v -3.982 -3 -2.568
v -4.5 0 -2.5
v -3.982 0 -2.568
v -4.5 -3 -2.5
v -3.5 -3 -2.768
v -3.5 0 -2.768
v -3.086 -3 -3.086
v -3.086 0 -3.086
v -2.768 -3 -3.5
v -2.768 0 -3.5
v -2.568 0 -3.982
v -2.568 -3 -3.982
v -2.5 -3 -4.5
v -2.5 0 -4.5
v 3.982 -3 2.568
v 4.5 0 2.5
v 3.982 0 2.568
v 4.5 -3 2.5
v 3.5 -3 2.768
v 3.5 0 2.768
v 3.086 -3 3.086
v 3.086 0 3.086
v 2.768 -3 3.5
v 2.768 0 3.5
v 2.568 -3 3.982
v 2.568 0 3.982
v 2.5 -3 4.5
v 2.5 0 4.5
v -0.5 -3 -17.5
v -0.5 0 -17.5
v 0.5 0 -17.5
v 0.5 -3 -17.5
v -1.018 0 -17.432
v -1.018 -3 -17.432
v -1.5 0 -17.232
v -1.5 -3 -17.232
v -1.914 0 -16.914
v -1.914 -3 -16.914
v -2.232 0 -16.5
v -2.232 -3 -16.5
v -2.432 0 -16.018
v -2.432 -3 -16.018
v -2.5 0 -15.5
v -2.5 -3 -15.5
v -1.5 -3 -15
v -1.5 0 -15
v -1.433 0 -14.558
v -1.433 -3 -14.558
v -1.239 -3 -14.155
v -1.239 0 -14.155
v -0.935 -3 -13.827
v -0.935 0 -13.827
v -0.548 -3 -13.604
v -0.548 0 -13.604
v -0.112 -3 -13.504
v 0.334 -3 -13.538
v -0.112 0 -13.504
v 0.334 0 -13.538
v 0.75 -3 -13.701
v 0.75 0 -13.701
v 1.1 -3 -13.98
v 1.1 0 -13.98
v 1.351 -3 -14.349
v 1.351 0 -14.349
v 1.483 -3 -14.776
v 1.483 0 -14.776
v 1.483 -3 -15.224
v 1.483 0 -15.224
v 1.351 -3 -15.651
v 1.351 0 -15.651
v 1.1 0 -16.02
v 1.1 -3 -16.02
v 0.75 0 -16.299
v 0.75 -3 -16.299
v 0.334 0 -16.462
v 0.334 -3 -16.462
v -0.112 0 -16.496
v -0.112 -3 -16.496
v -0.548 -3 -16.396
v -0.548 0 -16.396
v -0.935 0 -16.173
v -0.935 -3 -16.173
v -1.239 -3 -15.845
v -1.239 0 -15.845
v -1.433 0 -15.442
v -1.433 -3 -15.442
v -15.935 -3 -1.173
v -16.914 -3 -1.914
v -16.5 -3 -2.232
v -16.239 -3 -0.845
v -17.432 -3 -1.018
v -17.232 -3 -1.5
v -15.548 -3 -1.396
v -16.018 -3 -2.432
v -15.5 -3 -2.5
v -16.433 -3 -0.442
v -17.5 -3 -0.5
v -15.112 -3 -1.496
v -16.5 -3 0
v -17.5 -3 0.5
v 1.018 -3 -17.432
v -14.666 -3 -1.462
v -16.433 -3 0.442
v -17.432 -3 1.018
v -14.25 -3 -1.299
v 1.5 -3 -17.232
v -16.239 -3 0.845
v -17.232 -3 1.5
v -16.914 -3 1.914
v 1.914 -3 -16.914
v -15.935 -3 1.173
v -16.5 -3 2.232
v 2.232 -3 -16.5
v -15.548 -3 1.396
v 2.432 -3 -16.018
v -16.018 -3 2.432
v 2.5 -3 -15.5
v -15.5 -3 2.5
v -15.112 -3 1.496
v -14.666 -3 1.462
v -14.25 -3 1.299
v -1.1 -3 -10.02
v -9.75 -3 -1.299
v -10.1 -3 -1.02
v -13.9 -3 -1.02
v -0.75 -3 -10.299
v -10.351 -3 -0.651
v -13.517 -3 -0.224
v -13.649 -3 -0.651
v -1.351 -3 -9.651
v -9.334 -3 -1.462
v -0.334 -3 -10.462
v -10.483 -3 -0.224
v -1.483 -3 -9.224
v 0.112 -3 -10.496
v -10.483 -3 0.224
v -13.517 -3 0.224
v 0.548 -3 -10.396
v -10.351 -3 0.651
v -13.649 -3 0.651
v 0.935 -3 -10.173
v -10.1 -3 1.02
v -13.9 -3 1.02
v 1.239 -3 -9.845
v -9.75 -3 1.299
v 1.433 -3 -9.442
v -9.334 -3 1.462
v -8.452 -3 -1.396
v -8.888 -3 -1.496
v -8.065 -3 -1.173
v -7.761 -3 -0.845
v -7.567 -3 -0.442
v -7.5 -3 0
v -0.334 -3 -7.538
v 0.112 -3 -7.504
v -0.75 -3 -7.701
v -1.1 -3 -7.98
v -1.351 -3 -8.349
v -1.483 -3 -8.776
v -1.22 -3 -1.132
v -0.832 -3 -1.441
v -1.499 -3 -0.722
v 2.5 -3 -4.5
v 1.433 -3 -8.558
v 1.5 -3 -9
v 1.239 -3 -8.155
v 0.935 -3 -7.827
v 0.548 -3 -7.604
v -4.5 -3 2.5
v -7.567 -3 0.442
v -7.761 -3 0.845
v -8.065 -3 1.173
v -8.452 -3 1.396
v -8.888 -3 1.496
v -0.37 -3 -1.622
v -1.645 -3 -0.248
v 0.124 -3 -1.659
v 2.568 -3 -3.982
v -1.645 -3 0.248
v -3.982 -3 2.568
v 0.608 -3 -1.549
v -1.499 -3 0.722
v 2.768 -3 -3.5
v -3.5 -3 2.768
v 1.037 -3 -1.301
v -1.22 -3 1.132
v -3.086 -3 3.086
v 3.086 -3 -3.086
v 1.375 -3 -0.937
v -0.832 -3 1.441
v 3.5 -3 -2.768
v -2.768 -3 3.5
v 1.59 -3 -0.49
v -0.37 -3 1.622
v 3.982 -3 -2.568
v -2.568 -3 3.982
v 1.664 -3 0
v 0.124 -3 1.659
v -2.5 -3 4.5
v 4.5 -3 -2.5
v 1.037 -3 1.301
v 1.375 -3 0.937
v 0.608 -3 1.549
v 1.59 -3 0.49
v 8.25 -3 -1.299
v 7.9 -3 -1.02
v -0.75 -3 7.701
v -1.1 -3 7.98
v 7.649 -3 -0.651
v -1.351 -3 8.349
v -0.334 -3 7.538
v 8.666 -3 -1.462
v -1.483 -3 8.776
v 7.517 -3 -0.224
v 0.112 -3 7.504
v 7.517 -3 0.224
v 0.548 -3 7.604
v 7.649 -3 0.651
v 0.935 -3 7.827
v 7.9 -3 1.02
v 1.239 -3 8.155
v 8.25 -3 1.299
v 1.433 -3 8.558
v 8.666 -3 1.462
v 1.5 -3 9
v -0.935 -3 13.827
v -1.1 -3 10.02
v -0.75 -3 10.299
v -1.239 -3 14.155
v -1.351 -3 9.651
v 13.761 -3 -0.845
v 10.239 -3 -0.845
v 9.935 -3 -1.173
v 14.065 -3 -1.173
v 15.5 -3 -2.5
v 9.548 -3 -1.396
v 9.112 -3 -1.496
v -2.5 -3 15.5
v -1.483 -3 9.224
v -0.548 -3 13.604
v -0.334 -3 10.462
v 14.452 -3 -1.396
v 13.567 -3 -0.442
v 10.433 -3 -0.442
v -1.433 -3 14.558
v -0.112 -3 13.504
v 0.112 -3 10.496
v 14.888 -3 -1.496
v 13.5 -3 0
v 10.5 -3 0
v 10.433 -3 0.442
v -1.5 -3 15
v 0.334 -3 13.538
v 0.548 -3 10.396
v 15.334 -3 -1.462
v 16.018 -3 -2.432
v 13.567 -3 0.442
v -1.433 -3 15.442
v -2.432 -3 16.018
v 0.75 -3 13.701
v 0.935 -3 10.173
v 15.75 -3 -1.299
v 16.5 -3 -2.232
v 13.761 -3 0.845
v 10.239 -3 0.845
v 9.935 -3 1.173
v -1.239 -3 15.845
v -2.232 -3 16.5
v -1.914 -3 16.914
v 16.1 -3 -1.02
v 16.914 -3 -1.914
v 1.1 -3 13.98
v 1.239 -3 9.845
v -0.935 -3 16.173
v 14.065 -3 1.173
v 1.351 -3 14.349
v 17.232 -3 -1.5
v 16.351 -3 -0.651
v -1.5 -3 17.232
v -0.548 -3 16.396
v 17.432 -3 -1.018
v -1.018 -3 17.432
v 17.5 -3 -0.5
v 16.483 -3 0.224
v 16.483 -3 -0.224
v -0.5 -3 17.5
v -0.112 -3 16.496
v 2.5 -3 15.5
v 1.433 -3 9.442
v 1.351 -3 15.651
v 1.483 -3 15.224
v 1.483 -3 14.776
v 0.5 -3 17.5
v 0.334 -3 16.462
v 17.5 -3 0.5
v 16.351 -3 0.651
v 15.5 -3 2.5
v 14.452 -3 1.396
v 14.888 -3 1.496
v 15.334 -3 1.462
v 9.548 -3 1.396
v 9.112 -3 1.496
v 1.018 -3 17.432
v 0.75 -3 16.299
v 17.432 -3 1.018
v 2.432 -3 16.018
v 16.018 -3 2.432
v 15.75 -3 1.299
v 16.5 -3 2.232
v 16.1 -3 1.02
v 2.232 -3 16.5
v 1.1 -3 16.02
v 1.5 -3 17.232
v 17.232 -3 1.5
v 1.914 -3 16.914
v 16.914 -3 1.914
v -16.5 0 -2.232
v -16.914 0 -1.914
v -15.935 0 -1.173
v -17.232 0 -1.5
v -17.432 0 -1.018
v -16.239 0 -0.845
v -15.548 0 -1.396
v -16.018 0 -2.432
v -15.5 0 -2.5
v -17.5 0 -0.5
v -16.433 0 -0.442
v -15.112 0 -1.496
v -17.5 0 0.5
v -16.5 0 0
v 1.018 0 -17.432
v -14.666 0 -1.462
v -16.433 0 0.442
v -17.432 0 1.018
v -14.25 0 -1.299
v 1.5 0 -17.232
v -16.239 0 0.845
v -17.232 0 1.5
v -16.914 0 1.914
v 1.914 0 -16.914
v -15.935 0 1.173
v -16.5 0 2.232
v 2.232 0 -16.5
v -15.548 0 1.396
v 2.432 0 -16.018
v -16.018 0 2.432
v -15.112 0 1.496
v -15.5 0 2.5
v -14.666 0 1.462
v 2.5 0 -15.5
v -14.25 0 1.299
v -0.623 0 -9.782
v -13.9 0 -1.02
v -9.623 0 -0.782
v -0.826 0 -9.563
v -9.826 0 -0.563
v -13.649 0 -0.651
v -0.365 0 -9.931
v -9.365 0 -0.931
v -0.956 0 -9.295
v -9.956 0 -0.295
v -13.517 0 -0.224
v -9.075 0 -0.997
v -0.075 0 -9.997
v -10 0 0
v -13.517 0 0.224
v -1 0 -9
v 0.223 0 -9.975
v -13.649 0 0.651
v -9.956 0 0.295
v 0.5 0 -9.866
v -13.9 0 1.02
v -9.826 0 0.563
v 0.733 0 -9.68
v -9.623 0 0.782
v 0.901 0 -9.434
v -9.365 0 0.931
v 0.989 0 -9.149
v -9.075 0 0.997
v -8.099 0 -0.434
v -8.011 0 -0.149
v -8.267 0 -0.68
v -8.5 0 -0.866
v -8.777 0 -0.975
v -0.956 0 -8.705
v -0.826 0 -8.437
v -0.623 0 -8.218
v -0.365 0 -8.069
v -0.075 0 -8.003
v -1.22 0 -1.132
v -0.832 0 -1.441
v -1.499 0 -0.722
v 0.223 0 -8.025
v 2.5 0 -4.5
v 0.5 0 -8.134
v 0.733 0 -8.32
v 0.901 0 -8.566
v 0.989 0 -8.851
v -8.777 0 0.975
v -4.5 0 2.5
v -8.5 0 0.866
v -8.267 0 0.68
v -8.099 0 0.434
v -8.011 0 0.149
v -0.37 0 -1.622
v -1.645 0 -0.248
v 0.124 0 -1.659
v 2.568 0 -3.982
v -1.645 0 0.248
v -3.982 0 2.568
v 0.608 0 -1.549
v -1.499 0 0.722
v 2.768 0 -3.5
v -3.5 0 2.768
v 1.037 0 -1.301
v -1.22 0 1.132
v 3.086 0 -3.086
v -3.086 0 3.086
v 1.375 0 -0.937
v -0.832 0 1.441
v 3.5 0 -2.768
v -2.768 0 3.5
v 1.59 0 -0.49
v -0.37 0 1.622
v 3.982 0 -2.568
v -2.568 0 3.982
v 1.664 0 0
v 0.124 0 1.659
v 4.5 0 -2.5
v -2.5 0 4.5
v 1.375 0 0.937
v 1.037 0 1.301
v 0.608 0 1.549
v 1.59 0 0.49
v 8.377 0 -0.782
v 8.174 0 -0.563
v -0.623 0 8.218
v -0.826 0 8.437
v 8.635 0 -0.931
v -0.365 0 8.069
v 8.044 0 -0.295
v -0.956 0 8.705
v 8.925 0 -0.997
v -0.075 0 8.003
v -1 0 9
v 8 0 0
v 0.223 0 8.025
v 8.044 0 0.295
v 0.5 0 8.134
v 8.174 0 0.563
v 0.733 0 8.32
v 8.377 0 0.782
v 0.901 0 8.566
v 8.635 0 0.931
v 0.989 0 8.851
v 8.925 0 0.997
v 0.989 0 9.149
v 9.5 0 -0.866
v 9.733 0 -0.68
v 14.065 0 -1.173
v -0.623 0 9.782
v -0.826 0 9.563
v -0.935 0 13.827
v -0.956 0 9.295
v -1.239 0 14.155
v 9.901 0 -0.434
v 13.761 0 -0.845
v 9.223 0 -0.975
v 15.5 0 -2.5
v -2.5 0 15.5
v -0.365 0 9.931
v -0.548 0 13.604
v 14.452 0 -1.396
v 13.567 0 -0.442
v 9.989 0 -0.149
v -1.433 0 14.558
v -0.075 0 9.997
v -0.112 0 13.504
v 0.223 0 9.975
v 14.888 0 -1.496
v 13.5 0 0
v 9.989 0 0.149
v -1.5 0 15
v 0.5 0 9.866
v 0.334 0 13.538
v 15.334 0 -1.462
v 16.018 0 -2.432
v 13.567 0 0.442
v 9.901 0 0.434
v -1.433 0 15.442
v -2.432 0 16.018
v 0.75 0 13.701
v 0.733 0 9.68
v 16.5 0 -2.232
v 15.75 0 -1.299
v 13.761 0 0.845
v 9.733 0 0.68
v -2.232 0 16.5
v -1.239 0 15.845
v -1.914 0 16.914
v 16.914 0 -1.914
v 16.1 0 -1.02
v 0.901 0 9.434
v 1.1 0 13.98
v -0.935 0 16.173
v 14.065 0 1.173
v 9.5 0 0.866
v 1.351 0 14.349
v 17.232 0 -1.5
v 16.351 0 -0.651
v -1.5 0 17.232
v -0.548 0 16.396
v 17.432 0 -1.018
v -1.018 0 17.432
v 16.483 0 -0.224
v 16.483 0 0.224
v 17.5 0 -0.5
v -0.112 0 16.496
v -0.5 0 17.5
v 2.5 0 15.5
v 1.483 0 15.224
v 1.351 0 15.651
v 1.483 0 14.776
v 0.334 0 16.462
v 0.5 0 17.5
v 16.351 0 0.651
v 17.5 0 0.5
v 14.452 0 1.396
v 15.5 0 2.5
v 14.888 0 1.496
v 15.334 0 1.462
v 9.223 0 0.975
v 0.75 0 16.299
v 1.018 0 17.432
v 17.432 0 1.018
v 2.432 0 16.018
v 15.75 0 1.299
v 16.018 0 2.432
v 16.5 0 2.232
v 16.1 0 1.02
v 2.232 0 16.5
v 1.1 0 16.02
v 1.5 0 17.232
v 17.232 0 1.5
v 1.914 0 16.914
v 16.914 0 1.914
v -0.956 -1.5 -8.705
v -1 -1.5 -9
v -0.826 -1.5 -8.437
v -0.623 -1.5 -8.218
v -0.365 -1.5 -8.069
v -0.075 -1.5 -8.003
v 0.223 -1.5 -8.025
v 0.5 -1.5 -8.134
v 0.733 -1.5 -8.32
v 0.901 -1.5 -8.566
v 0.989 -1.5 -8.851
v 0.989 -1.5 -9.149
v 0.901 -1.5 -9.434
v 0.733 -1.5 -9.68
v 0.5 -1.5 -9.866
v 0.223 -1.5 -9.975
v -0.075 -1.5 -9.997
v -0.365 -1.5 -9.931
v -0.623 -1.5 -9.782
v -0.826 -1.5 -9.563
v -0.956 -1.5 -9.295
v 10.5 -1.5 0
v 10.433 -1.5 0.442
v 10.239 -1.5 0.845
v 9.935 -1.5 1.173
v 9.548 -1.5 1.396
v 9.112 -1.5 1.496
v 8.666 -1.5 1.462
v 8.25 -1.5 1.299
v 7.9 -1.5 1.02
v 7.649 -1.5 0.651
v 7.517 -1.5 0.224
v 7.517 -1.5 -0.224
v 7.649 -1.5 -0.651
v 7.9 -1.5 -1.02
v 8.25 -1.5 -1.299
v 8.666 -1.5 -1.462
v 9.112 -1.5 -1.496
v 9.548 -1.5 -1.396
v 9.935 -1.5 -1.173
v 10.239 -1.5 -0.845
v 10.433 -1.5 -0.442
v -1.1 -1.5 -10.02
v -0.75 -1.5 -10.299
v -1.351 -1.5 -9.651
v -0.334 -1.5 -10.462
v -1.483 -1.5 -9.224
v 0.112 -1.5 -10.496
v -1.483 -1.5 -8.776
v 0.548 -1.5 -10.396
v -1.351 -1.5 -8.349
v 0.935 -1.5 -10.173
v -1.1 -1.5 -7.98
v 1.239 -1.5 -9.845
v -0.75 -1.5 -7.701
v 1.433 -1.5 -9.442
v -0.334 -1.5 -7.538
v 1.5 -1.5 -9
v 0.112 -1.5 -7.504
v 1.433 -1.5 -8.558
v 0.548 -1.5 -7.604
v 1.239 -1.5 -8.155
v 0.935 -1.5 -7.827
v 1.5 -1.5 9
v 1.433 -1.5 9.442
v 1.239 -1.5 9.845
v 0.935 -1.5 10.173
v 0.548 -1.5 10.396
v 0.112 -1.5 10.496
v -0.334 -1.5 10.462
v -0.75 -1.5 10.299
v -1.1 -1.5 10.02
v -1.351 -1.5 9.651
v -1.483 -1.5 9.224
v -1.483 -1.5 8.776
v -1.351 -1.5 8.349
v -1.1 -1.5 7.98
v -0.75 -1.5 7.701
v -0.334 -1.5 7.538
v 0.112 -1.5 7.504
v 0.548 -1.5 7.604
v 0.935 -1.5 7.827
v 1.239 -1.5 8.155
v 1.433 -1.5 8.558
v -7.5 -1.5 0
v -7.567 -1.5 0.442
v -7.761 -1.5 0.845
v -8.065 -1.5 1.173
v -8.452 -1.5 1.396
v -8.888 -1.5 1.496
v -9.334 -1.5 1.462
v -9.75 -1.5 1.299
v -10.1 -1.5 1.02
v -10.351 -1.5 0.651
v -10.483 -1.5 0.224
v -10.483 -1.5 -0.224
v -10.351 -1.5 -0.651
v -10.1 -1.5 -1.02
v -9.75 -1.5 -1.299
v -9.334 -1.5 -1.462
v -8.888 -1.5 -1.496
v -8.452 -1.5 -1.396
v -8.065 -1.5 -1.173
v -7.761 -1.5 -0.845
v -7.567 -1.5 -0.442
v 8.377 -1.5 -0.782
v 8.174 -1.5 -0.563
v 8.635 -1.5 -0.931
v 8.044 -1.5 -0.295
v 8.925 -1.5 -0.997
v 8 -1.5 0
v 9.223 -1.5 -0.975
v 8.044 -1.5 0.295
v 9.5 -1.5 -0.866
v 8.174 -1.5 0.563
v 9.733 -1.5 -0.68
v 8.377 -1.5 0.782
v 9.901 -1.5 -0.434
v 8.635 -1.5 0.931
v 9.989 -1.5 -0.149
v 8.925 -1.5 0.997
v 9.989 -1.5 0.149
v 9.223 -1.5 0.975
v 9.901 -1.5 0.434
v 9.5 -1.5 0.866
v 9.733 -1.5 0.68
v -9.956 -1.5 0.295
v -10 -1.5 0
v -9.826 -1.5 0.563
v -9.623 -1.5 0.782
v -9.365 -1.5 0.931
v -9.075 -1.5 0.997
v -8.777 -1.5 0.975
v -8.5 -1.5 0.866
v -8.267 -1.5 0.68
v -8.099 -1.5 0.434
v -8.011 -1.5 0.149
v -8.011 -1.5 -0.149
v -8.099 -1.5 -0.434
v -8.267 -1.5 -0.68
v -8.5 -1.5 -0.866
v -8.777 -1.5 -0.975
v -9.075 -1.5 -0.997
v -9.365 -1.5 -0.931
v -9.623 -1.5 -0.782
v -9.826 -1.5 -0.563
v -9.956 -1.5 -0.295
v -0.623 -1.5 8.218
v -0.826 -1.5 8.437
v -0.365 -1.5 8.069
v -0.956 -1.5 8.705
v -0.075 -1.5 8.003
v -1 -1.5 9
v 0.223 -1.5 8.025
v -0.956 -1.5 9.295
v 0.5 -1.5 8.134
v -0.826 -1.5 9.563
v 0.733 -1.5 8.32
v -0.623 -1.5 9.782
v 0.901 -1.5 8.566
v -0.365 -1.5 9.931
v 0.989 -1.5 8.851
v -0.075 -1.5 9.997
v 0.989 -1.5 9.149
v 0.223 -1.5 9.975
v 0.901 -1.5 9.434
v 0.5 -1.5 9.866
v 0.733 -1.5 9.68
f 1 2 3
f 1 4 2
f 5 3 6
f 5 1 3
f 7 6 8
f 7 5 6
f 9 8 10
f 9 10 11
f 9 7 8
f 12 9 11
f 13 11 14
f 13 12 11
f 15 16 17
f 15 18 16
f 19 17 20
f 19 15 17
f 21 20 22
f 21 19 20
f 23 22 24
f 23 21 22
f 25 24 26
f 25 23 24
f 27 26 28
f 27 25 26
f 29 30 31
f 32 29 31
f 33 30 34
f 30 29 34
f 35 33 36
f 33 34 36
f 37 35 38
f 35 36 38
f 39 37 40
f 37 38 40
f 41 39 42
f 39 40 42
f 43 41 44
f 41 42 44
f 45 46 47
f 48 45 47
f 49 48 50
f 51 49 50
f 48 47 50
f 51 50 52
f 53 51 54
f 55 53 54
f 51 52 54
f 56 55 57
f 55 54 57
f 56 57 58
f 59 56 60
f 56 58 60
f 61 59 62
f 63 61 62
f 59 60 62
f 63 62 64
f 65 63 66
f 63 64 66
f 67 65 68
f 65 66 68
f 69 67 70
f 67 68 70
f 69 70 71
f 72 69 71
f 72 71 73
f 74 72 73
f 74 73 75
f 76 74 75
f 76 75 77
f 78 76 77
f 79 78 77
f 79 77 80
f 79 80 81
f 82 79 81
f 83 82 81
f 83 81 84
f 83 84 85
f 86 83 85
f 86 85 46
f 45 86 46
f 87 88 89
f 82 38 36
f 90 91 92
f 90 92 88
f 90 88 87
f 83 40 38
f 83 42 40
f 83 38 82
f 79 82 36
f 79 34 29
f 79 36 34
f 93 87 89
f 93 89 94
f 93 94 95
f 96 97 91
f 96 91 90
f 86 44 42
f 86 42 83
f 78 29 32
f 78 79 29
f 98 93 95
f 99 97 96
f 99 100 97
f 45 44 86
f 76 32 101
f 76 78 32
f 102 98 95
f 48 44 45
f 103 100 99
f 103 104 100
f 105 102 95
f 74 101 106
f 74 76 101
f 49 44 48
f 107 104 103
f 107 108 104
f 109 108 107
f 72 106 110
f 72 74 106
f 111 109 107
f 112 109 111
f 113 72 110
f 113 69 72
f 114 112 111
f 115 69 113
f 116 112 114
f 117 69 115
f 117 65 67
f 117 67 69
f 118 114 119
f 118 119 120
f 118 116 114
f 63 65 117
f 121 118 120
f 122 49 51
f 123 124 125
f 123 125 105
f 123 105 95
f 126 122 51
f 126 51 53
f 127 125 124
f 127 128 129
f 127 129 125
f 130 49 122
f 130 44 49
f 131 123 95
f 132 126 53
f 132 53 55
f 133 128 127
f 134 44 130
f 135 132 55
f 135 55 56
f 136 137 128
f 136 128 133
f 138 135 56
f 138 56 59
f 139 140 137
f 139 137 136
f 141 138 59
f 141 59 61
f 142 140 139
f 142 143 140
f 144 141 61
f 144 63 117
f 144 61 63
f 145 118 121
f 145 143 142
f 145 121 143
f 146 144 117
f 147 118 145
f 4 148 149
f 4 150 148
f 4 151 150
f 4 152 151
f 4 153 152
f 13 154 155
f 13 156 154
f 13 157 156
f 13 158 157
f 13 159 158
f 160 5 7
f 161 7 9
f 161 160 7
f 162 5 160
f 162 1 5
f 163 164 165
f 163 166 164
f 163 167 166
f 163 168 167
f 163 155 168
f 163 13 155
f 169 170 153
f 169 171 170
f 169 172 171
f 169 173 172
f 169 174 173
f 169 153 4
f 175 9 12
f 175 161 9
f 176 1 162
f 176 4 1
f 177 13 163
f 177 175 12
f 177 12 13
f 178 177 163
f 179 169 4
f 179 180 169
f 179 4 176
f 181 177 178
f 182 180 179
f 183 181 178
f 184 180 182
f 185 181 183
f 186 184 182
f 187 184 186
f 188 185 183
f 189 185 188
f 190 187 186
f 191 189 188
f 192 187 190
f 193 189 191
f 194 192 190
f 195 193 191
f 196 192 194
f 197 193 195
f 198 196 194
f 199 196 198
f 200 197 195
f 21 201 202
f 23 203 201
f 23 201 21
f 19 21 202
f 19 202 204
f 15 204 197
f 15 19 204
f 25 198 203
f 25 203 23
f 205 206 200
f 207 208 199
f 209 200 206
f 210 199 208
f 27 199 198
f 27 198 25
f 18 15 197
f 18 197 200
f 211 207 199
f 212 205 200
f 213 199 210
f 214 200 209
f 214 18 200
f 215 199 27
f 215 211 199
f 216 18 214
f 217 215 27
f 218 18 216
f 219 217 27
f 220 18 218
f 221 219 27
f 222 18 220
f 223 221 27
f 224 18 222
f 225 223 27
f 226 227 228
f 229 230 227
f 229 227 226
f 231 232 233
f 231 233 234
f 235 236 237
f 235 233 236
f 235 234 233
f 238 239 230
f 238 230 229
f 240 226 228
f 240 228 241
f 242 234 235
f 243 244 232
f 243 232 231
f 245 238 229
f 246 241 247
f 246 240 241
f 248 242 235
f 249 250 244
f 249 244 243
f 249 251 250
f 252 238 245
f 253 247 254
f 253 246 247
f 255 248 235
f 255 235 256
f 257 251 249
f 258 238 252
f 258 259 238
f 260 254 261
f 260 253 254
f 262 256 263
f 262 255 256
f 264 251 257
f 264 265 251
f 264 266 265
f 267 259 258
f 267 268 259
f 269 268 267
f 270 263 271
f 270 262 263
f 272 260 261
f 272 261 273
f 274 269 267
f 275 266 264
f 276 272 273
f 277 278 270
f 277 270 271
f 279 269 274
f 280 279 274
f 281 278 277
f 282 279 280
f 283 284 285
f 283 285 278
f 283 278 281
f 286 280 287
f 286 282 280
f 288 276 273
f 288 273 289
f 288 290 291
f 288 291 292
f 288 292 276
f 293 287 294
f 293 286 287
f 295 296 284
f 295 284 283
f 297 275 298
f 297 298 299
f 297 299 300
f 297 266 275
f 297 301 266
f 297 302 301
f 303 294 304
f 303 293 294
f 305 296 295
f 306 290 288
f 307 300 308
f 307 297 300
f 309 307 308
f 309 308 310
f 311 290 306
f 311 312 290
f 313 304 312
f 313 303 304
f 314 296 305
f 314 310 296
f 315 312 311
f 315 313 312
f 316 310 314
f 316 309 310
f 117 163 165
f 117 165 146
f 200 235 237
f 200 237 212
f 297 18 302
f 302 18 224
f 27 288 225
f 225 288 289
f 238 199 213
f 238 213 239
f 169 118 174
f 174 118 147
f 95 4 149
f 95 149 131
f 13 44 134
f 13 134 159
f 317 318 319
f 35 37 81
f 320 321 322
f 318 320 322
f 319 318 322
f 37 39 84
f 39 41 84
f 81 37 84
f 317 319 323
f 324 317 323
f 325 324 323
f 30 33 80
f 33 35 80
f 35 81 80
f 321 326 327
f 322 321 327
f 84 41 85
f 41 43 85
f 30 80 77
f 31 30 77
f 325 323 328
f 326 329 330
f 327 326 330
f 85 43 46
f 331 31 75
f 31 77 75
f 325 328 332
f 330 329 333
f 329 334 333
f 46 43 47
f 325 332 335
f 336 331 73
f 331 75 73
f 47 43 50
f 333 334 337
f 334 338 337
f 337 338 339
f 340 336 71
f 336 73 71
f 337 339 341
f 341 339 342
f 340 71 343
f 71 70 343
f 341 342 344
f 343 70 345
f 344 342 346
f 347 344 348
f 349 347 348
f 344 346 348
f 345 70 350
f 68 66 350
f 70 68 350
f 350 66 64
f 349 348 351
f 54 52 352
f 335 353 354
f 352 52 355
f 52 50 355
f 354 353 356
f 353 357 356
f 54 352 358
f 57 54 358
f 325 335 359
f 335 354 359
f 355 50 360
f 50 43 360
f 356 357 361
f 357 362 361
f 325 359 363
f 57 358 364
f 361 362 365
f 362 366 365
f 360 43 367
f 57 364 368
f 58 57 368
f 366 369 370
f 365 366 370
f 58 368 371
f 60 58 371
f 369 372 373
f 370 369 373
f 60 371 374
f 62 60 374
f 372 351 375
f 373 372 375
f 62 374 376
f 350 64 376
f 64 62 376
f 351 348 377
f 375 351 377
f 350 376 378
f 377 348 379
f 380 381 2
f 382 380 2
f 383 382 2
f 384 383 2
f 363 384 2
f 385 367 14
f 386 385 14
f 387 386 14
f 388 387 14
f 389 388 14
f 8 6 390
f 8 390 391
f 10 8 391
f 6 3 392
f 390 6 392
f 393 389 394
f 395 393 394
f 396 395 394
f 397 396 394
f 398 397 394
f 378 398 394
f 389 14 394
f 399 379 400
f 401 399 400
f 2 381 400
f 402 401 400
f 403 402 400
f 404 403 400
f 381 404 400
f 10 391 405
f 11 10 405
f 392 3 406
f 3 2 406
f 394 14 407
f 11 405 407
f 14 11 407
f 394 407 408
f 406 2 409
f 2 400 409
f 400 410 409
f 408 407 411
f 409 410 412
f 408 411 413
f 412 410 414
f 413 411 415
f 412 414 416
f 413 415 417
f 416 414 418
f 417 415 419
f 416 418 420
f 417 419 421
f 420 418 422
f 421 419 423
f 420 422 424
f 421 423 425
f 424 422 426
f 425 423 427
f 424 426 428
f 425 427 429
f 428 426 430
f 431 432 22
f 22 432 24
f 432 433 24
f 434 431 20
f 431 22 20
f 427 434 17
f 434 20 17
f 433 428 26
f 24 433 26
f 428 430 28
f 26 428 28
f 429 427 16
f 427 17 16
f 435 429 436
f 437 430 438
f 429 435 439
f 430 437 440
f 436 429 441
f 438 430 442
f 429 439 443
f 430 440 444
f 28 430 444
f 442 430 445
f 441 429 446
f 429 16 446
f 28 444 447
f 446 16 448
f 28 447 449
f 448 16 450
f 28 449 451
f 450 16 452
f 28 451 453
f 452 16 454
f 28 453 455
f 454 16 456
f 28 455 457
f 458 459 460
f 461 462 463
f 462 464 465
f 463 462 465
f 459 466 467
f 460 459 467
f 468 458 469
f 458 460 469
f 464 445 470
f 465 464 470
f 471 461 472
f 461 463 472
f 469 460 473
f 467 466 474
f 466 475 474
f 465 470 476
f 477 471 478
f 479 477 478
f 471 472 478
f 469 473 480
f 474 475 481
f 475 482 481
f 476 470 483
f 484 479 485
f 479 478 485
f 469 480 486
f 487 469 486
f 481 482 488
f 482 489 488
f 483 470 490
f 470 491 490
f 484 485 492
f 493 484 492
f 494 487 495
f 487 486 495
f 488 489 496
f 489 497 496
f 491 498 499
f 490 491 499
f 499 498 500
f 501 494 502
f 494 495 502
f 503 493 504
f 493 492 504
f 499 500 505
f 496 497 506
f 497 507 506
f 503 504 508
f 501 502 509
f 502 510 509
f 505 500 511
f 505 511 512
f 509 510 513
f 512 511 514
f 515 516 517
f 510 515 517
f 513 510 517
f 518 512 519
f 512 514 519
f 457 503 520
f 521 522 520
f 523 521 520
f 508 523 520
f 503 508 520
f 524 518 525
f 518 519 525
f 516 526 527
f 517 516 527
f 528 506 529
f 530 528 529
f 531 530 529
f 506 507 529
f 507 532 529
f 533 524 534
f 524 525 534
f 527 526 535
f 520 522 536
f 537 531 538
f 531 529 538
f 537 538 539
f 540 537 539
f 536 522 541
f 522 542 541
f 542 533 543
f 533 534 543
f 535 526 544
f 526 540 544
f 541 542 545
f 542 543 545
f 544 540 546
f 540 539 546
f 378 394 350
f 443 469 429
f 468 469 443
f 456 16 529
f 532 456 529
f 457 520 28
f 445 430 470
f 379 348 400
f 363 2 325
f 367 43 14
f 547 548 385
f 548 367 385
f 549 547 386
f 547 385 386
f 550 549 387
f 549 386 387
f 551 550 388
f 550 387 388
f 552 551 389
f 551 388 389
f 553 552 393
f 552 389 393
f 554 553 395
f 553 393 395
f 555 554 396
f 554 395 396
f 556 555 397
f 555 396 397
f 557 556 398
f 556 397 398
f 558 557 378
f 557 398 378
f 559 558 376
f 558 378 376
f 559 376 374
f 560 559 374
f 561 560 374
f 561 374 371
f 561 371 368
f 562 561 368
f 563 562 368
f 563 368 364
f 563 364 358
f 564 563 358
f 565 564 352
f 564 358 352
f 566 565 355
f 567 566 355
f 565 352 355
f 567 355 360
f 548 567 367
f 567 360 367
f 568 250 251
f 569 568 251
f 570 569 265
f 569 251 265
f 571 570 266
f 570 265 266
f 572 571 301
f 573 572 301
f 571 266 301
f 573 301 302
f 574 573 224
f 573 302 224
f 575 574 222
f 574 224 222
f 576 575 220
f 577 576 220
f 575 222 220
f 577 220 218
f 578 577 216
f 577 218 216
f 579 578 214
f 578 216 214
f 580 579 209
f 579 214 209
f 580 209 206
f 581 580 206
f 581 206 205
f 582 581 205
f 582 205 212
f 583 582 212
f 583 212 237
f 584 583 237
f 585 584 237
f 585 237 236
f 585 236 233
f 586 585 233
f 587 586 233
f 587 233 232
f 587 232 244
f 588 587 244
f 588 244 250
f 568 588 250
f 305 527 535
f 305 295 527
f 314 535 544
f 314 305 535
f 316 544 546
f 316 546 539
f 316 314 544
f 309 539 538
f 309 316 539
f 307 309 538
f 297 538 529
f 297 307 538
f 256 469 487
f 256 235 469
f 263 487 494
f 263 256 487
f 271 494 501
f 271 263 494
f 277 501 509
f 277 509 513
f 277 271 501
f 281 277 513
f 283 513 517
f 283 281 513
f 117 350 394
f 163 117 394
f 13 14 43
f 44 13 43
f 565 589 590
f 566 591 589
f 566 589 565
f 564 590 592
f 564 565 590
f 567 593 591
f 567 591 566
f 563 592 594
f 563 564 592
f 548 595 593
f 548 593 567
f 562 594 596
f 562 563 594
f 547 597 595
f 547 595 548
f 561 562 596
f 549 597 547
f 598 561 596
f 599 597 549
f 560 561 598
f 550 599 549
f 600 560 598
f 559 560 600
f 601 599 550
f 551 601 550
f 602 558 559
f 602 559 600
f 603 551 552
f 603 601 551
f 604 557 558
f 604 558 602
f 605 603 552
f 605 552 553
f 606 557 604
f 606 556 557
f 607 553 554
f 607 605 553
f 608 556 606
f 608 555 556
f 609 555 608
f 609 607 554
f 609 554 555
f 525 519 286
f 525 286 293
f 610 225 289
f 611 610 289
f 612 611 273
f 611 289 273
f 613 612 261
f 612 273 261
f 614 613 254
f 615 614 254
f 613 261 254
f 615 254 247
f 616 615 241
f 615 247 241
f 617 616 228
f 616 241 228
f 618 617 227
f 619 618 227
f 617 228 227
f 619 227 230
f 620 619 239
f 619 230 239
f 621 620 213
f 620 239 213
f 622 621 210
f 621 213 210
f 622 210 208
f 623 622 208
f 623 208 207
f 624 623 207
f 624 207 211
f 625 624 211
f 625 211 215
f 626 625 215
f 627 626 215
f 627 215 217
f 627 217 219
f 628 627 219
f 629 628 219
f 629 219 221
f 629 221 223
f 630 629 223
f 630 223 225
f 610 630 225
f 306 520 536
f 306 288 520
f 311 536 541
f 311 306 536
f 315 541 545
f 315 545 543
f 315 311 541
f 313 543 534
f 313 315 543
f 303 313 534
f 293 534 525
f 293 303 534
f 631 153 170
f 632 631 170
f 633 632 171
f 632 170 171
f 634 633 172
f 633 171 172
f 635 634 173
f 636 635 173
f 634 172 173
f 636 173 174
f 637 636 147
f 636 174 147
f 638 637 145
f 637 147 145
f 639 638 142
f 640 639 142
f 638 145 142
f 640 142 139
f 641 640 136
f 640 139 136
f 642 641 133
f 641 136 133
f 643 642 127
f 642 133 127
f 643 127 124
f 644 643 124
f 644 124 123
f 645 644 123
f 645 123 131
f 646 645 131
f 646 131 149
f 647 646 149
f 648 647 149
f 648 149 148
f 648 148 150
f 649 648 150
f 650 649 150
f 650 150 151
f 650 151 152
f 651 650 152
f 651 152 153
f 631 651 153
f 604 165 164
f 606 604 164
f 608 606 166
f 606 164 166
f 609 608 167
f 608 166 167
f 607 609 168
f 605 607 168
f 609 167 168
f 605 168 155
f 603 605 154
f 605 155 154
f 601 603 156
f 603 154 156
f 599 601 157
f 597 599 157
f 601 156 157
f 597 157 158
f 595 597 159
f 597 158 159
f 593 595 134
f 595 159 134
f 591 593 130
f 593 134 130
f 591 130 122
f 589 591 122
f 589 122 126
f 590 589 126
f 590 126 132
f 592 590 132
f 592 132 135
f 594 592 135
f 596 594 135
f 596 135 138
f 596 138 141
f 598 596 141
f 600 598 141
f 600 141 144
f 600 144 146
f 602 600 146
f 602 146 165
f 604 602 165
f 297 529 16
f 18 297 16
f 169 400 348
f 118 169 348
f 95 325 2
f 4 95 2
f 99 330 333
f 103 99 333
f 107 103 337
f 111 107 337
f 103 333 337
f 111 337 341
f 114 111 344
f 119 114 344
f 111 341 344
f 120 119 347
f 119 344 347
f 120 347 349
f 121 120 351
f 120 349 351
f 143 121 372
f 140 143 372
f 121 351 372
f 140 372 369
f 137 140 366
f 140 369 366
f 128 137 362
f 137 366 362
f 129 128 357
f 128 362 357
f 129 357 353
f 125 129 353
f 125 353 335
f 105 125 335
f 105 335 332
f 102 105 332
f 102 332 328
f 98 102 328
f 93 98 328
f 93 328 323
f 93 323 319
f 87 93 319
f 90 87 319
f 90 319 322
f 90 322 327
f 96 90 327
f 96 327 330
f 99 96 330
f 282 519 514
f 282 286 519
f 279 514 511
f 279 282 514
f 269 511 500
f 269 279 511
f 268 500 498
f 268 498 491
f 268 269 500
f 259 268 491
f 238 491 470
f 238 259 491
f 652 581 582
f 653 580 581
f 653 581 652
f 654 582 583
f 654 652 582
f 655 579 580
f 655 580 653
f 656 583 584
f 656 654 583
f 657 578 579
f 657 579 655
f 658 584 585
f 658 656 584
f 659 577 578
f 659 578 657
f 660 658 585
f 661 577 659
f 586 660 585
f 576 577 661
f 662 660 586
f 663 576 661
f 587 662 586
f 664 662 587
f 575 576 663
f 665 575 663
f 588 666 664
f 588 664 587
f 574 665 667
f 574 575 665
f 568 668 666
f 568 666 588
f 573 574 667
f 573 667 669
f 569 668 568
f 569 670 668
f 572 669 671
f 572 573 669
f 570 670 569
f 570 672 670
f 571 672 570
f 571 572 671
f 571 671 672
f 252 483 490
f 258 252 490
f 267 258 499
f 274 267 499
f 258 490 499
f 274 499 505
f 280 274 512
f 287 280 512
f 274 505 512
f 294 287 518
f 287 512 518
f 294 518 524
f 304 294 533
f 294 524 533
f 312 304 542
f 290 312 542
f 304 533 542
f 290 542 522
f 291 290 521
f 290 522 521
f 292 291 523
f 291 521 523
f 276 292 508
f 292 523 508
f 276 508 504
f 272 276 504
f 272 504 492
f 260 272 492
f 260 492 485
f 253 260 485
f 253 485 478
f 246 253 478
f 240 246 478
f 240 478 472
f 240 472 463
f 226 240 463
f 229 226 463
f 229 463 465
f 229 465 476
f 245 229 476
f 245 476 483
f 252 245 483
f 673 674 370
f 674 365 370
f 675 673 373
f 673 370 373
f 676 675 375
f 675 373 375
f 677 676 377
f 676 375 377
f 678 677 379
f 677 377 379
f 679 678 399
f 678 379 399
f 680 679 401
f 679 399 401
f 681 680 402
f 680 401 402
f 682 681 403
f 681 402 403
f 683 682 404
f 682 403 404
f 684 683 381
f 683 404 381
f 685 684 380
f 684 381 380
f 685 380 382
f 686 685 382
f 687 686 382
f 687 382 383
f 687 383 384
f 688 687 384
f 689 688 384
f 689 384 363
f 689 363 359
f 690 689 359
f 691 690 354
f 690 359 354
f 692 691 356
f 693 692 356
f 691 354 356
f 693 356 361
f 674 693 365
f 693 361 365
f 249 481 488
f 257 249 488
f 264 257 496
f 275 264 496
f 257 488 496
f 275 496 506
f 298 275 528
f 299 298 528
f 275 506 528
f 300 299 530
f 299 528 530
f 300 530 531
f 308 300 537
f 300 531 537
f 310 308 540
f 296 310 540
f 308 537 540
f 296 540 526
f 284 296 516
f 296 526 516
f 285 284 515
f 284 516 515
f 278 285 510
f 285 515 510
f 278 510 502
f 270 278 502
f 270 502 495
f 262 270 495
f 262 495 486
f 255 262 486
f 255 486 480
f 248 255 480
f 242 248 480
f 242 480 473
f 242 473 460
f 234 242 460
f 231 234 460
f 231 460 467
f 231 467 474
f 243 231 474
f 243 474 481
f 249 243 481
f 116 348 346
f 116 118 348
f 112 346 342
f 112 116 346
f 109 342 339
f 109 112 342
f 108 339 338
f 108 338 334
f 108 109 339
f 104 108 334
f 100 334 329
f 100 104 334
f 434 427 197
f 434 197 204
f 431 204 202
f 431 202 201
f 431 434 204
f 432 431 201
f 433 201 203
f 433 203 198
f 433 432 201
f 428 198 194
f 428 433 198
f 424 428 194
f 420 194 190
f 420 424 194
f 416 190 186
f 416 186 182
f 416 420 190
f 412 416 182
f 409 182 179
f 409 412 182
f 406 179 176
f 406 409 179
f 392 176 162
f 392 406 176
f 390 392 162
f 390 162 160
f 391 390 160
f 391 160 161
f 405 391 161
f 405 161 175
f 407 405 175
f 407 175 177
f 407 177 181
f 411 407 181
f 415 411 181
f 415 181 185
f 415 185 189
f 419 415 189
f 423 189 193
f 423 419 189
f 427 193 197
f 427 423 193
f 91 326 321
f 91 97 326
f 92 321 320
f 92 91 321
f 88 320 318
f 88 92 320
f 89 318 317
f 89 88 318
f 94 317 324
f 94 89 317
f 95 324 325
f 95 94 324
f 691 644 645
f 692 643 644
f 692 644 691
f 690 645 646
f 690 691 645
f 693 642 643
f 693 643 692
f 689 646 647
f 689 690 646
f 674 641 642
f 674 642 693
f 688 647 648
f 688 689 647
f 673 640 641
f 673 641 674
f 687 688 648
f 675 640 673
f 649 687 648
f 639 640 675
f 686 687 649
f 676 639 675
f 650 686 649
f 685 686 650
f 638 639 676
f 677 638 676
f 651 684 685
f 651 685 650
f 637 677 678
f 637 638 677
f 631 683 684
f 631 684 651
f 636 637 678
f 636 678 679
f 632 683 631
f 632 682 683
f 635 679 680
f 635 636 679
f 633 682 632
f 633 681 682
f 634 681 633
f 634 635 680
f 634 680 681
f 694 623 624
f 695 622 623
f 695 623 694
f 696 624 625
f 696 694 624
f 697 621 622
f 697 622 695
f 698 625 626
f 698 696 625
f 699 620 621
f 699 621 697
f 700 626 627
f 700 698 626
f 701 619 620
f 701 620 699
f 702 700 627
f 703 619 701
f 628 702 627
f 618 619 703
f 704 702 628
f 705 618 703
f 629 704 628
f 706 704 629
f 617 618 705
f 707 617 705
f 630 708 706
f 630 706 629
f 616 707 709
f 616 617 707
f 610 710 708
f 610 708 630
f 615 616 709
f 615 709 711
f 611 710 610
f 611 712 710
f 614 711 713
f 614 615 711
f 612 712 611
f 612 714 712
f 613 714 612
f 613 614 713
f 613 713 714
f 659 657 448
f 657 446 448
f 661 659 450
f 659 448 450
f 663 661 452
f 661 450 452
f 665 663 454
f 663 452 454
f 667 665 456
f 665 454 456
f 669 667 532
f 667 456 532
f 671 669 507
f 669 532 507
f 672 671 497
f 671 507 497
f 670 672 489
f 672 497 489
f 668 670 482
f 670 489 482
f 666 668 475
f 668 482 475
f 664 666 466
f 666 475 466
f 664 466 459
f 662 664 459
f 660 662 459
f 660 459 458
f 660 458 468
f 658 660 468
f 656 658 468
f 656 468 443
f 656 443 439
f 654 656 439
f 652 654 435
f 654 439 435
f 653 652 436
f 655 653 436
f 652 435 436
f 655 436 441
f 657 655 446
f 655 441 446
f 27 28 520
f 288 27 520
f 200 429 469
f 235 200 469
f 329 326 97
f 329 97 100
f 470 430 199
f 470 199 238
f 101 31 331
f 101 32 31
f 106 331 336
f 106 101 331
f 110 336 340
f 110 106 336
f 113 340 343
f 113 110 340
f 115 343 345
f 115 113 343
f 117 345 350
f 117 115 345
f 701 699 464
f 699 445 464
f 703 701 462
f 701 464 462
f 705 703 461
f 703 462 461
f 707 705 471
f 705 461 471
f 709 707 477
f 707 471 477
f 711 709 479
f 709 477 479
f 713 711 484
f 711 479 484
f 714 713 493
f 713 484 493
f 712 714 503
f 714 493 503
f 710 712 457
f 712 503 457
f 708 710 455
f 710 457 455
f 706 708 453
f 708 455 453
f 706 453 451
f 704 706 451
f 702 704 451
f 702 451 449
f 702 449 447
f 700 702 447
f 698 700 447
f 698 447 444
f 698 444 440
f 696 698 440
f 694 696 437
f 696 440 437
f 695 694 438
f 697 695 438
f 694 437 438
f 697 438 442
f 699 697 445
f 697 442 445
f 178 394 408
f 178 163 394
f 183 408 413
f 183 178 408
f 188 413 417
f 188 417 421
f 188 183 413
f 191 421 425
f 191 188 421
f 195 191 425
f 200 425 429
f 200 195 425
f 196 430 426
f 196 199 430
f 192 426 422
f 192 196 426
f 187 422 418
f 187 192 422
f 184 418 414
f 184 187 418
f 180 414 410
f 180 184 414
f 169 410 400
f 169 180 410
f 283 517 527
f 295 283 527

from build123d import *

# Parameters (mm, degrees)
F0_W           = 5
F0_H           = 15
F0_H_2         = 5
F0_R           = 1.663624267
F0_W_2         = 15
F1_DEPTH       = 3
F2_R           = 2
F4_D           = 3
F6_D           = 2
F6_CBORE_D     = 3
F6_CBORE_DEPTH = 1.5


with BuildPart() as f1:
    # F0 (on Front) → F1 (new body)
    with BuildSketch(Plane.XZ):
        with Locations((0, -10)):
            Rectangle(F0_W, F0_H)
        Rectangle(F0_W, F0_H_2)
        Circle(F0_R, mode=Mode.SUBTRACT)
        with Locations((10, 0)):
            Rectangle(F0_W_2, F0_H_2)
        with Locations((-10, 0)):
            Rectangle(F0_W_2, F0_H_2)
        with Locations((0, 10)):
            Rectangle(F0_W, F0_H)
    extrude(amount=F1_DEPTH)

    # F2
    f2_edges = [f1.edges().sort_by_distance(p)[0] for p in [
        (17.5, -1.5, 2.5),
        (17.5, -1.5, -2.5),
        (2.5, -1.5, -17.5),
        (-17.5, -1.5, 2.5),
        (2.5, -1.5, 17.5),
        (-2.5, -1.5, 17.5),
        (-2.5, -1.5, -17.5),
        (-17.5, -1.5, -2.5),
        (-2.5, -1.5, 2.5),
        (2.5, -1.5, -2.5),
        (2.5, -1.5, 2.5),
        (-2.5, -1.5, -2.5),
    ]]
    fillet(f2_edges, radius=F2_R)

    # F4 (through all)
    with Locations(Plane.XZ.offset(3)):
        with Locations((-15, 0), (0, 15), (15, 0), (0, -15)):
            Hole(F4_D / 2)

    # F6 (through all)
    with Locations(Plane.XZ.offset(3)):
        with Locations((0, 9), (9, 0), (0, -9), (-9, 0)):
            CounterBoreHole(F6_D / 2, F6_CBORE_D / 2, F6_CBORE_DEPTH)


solid = f1.part
